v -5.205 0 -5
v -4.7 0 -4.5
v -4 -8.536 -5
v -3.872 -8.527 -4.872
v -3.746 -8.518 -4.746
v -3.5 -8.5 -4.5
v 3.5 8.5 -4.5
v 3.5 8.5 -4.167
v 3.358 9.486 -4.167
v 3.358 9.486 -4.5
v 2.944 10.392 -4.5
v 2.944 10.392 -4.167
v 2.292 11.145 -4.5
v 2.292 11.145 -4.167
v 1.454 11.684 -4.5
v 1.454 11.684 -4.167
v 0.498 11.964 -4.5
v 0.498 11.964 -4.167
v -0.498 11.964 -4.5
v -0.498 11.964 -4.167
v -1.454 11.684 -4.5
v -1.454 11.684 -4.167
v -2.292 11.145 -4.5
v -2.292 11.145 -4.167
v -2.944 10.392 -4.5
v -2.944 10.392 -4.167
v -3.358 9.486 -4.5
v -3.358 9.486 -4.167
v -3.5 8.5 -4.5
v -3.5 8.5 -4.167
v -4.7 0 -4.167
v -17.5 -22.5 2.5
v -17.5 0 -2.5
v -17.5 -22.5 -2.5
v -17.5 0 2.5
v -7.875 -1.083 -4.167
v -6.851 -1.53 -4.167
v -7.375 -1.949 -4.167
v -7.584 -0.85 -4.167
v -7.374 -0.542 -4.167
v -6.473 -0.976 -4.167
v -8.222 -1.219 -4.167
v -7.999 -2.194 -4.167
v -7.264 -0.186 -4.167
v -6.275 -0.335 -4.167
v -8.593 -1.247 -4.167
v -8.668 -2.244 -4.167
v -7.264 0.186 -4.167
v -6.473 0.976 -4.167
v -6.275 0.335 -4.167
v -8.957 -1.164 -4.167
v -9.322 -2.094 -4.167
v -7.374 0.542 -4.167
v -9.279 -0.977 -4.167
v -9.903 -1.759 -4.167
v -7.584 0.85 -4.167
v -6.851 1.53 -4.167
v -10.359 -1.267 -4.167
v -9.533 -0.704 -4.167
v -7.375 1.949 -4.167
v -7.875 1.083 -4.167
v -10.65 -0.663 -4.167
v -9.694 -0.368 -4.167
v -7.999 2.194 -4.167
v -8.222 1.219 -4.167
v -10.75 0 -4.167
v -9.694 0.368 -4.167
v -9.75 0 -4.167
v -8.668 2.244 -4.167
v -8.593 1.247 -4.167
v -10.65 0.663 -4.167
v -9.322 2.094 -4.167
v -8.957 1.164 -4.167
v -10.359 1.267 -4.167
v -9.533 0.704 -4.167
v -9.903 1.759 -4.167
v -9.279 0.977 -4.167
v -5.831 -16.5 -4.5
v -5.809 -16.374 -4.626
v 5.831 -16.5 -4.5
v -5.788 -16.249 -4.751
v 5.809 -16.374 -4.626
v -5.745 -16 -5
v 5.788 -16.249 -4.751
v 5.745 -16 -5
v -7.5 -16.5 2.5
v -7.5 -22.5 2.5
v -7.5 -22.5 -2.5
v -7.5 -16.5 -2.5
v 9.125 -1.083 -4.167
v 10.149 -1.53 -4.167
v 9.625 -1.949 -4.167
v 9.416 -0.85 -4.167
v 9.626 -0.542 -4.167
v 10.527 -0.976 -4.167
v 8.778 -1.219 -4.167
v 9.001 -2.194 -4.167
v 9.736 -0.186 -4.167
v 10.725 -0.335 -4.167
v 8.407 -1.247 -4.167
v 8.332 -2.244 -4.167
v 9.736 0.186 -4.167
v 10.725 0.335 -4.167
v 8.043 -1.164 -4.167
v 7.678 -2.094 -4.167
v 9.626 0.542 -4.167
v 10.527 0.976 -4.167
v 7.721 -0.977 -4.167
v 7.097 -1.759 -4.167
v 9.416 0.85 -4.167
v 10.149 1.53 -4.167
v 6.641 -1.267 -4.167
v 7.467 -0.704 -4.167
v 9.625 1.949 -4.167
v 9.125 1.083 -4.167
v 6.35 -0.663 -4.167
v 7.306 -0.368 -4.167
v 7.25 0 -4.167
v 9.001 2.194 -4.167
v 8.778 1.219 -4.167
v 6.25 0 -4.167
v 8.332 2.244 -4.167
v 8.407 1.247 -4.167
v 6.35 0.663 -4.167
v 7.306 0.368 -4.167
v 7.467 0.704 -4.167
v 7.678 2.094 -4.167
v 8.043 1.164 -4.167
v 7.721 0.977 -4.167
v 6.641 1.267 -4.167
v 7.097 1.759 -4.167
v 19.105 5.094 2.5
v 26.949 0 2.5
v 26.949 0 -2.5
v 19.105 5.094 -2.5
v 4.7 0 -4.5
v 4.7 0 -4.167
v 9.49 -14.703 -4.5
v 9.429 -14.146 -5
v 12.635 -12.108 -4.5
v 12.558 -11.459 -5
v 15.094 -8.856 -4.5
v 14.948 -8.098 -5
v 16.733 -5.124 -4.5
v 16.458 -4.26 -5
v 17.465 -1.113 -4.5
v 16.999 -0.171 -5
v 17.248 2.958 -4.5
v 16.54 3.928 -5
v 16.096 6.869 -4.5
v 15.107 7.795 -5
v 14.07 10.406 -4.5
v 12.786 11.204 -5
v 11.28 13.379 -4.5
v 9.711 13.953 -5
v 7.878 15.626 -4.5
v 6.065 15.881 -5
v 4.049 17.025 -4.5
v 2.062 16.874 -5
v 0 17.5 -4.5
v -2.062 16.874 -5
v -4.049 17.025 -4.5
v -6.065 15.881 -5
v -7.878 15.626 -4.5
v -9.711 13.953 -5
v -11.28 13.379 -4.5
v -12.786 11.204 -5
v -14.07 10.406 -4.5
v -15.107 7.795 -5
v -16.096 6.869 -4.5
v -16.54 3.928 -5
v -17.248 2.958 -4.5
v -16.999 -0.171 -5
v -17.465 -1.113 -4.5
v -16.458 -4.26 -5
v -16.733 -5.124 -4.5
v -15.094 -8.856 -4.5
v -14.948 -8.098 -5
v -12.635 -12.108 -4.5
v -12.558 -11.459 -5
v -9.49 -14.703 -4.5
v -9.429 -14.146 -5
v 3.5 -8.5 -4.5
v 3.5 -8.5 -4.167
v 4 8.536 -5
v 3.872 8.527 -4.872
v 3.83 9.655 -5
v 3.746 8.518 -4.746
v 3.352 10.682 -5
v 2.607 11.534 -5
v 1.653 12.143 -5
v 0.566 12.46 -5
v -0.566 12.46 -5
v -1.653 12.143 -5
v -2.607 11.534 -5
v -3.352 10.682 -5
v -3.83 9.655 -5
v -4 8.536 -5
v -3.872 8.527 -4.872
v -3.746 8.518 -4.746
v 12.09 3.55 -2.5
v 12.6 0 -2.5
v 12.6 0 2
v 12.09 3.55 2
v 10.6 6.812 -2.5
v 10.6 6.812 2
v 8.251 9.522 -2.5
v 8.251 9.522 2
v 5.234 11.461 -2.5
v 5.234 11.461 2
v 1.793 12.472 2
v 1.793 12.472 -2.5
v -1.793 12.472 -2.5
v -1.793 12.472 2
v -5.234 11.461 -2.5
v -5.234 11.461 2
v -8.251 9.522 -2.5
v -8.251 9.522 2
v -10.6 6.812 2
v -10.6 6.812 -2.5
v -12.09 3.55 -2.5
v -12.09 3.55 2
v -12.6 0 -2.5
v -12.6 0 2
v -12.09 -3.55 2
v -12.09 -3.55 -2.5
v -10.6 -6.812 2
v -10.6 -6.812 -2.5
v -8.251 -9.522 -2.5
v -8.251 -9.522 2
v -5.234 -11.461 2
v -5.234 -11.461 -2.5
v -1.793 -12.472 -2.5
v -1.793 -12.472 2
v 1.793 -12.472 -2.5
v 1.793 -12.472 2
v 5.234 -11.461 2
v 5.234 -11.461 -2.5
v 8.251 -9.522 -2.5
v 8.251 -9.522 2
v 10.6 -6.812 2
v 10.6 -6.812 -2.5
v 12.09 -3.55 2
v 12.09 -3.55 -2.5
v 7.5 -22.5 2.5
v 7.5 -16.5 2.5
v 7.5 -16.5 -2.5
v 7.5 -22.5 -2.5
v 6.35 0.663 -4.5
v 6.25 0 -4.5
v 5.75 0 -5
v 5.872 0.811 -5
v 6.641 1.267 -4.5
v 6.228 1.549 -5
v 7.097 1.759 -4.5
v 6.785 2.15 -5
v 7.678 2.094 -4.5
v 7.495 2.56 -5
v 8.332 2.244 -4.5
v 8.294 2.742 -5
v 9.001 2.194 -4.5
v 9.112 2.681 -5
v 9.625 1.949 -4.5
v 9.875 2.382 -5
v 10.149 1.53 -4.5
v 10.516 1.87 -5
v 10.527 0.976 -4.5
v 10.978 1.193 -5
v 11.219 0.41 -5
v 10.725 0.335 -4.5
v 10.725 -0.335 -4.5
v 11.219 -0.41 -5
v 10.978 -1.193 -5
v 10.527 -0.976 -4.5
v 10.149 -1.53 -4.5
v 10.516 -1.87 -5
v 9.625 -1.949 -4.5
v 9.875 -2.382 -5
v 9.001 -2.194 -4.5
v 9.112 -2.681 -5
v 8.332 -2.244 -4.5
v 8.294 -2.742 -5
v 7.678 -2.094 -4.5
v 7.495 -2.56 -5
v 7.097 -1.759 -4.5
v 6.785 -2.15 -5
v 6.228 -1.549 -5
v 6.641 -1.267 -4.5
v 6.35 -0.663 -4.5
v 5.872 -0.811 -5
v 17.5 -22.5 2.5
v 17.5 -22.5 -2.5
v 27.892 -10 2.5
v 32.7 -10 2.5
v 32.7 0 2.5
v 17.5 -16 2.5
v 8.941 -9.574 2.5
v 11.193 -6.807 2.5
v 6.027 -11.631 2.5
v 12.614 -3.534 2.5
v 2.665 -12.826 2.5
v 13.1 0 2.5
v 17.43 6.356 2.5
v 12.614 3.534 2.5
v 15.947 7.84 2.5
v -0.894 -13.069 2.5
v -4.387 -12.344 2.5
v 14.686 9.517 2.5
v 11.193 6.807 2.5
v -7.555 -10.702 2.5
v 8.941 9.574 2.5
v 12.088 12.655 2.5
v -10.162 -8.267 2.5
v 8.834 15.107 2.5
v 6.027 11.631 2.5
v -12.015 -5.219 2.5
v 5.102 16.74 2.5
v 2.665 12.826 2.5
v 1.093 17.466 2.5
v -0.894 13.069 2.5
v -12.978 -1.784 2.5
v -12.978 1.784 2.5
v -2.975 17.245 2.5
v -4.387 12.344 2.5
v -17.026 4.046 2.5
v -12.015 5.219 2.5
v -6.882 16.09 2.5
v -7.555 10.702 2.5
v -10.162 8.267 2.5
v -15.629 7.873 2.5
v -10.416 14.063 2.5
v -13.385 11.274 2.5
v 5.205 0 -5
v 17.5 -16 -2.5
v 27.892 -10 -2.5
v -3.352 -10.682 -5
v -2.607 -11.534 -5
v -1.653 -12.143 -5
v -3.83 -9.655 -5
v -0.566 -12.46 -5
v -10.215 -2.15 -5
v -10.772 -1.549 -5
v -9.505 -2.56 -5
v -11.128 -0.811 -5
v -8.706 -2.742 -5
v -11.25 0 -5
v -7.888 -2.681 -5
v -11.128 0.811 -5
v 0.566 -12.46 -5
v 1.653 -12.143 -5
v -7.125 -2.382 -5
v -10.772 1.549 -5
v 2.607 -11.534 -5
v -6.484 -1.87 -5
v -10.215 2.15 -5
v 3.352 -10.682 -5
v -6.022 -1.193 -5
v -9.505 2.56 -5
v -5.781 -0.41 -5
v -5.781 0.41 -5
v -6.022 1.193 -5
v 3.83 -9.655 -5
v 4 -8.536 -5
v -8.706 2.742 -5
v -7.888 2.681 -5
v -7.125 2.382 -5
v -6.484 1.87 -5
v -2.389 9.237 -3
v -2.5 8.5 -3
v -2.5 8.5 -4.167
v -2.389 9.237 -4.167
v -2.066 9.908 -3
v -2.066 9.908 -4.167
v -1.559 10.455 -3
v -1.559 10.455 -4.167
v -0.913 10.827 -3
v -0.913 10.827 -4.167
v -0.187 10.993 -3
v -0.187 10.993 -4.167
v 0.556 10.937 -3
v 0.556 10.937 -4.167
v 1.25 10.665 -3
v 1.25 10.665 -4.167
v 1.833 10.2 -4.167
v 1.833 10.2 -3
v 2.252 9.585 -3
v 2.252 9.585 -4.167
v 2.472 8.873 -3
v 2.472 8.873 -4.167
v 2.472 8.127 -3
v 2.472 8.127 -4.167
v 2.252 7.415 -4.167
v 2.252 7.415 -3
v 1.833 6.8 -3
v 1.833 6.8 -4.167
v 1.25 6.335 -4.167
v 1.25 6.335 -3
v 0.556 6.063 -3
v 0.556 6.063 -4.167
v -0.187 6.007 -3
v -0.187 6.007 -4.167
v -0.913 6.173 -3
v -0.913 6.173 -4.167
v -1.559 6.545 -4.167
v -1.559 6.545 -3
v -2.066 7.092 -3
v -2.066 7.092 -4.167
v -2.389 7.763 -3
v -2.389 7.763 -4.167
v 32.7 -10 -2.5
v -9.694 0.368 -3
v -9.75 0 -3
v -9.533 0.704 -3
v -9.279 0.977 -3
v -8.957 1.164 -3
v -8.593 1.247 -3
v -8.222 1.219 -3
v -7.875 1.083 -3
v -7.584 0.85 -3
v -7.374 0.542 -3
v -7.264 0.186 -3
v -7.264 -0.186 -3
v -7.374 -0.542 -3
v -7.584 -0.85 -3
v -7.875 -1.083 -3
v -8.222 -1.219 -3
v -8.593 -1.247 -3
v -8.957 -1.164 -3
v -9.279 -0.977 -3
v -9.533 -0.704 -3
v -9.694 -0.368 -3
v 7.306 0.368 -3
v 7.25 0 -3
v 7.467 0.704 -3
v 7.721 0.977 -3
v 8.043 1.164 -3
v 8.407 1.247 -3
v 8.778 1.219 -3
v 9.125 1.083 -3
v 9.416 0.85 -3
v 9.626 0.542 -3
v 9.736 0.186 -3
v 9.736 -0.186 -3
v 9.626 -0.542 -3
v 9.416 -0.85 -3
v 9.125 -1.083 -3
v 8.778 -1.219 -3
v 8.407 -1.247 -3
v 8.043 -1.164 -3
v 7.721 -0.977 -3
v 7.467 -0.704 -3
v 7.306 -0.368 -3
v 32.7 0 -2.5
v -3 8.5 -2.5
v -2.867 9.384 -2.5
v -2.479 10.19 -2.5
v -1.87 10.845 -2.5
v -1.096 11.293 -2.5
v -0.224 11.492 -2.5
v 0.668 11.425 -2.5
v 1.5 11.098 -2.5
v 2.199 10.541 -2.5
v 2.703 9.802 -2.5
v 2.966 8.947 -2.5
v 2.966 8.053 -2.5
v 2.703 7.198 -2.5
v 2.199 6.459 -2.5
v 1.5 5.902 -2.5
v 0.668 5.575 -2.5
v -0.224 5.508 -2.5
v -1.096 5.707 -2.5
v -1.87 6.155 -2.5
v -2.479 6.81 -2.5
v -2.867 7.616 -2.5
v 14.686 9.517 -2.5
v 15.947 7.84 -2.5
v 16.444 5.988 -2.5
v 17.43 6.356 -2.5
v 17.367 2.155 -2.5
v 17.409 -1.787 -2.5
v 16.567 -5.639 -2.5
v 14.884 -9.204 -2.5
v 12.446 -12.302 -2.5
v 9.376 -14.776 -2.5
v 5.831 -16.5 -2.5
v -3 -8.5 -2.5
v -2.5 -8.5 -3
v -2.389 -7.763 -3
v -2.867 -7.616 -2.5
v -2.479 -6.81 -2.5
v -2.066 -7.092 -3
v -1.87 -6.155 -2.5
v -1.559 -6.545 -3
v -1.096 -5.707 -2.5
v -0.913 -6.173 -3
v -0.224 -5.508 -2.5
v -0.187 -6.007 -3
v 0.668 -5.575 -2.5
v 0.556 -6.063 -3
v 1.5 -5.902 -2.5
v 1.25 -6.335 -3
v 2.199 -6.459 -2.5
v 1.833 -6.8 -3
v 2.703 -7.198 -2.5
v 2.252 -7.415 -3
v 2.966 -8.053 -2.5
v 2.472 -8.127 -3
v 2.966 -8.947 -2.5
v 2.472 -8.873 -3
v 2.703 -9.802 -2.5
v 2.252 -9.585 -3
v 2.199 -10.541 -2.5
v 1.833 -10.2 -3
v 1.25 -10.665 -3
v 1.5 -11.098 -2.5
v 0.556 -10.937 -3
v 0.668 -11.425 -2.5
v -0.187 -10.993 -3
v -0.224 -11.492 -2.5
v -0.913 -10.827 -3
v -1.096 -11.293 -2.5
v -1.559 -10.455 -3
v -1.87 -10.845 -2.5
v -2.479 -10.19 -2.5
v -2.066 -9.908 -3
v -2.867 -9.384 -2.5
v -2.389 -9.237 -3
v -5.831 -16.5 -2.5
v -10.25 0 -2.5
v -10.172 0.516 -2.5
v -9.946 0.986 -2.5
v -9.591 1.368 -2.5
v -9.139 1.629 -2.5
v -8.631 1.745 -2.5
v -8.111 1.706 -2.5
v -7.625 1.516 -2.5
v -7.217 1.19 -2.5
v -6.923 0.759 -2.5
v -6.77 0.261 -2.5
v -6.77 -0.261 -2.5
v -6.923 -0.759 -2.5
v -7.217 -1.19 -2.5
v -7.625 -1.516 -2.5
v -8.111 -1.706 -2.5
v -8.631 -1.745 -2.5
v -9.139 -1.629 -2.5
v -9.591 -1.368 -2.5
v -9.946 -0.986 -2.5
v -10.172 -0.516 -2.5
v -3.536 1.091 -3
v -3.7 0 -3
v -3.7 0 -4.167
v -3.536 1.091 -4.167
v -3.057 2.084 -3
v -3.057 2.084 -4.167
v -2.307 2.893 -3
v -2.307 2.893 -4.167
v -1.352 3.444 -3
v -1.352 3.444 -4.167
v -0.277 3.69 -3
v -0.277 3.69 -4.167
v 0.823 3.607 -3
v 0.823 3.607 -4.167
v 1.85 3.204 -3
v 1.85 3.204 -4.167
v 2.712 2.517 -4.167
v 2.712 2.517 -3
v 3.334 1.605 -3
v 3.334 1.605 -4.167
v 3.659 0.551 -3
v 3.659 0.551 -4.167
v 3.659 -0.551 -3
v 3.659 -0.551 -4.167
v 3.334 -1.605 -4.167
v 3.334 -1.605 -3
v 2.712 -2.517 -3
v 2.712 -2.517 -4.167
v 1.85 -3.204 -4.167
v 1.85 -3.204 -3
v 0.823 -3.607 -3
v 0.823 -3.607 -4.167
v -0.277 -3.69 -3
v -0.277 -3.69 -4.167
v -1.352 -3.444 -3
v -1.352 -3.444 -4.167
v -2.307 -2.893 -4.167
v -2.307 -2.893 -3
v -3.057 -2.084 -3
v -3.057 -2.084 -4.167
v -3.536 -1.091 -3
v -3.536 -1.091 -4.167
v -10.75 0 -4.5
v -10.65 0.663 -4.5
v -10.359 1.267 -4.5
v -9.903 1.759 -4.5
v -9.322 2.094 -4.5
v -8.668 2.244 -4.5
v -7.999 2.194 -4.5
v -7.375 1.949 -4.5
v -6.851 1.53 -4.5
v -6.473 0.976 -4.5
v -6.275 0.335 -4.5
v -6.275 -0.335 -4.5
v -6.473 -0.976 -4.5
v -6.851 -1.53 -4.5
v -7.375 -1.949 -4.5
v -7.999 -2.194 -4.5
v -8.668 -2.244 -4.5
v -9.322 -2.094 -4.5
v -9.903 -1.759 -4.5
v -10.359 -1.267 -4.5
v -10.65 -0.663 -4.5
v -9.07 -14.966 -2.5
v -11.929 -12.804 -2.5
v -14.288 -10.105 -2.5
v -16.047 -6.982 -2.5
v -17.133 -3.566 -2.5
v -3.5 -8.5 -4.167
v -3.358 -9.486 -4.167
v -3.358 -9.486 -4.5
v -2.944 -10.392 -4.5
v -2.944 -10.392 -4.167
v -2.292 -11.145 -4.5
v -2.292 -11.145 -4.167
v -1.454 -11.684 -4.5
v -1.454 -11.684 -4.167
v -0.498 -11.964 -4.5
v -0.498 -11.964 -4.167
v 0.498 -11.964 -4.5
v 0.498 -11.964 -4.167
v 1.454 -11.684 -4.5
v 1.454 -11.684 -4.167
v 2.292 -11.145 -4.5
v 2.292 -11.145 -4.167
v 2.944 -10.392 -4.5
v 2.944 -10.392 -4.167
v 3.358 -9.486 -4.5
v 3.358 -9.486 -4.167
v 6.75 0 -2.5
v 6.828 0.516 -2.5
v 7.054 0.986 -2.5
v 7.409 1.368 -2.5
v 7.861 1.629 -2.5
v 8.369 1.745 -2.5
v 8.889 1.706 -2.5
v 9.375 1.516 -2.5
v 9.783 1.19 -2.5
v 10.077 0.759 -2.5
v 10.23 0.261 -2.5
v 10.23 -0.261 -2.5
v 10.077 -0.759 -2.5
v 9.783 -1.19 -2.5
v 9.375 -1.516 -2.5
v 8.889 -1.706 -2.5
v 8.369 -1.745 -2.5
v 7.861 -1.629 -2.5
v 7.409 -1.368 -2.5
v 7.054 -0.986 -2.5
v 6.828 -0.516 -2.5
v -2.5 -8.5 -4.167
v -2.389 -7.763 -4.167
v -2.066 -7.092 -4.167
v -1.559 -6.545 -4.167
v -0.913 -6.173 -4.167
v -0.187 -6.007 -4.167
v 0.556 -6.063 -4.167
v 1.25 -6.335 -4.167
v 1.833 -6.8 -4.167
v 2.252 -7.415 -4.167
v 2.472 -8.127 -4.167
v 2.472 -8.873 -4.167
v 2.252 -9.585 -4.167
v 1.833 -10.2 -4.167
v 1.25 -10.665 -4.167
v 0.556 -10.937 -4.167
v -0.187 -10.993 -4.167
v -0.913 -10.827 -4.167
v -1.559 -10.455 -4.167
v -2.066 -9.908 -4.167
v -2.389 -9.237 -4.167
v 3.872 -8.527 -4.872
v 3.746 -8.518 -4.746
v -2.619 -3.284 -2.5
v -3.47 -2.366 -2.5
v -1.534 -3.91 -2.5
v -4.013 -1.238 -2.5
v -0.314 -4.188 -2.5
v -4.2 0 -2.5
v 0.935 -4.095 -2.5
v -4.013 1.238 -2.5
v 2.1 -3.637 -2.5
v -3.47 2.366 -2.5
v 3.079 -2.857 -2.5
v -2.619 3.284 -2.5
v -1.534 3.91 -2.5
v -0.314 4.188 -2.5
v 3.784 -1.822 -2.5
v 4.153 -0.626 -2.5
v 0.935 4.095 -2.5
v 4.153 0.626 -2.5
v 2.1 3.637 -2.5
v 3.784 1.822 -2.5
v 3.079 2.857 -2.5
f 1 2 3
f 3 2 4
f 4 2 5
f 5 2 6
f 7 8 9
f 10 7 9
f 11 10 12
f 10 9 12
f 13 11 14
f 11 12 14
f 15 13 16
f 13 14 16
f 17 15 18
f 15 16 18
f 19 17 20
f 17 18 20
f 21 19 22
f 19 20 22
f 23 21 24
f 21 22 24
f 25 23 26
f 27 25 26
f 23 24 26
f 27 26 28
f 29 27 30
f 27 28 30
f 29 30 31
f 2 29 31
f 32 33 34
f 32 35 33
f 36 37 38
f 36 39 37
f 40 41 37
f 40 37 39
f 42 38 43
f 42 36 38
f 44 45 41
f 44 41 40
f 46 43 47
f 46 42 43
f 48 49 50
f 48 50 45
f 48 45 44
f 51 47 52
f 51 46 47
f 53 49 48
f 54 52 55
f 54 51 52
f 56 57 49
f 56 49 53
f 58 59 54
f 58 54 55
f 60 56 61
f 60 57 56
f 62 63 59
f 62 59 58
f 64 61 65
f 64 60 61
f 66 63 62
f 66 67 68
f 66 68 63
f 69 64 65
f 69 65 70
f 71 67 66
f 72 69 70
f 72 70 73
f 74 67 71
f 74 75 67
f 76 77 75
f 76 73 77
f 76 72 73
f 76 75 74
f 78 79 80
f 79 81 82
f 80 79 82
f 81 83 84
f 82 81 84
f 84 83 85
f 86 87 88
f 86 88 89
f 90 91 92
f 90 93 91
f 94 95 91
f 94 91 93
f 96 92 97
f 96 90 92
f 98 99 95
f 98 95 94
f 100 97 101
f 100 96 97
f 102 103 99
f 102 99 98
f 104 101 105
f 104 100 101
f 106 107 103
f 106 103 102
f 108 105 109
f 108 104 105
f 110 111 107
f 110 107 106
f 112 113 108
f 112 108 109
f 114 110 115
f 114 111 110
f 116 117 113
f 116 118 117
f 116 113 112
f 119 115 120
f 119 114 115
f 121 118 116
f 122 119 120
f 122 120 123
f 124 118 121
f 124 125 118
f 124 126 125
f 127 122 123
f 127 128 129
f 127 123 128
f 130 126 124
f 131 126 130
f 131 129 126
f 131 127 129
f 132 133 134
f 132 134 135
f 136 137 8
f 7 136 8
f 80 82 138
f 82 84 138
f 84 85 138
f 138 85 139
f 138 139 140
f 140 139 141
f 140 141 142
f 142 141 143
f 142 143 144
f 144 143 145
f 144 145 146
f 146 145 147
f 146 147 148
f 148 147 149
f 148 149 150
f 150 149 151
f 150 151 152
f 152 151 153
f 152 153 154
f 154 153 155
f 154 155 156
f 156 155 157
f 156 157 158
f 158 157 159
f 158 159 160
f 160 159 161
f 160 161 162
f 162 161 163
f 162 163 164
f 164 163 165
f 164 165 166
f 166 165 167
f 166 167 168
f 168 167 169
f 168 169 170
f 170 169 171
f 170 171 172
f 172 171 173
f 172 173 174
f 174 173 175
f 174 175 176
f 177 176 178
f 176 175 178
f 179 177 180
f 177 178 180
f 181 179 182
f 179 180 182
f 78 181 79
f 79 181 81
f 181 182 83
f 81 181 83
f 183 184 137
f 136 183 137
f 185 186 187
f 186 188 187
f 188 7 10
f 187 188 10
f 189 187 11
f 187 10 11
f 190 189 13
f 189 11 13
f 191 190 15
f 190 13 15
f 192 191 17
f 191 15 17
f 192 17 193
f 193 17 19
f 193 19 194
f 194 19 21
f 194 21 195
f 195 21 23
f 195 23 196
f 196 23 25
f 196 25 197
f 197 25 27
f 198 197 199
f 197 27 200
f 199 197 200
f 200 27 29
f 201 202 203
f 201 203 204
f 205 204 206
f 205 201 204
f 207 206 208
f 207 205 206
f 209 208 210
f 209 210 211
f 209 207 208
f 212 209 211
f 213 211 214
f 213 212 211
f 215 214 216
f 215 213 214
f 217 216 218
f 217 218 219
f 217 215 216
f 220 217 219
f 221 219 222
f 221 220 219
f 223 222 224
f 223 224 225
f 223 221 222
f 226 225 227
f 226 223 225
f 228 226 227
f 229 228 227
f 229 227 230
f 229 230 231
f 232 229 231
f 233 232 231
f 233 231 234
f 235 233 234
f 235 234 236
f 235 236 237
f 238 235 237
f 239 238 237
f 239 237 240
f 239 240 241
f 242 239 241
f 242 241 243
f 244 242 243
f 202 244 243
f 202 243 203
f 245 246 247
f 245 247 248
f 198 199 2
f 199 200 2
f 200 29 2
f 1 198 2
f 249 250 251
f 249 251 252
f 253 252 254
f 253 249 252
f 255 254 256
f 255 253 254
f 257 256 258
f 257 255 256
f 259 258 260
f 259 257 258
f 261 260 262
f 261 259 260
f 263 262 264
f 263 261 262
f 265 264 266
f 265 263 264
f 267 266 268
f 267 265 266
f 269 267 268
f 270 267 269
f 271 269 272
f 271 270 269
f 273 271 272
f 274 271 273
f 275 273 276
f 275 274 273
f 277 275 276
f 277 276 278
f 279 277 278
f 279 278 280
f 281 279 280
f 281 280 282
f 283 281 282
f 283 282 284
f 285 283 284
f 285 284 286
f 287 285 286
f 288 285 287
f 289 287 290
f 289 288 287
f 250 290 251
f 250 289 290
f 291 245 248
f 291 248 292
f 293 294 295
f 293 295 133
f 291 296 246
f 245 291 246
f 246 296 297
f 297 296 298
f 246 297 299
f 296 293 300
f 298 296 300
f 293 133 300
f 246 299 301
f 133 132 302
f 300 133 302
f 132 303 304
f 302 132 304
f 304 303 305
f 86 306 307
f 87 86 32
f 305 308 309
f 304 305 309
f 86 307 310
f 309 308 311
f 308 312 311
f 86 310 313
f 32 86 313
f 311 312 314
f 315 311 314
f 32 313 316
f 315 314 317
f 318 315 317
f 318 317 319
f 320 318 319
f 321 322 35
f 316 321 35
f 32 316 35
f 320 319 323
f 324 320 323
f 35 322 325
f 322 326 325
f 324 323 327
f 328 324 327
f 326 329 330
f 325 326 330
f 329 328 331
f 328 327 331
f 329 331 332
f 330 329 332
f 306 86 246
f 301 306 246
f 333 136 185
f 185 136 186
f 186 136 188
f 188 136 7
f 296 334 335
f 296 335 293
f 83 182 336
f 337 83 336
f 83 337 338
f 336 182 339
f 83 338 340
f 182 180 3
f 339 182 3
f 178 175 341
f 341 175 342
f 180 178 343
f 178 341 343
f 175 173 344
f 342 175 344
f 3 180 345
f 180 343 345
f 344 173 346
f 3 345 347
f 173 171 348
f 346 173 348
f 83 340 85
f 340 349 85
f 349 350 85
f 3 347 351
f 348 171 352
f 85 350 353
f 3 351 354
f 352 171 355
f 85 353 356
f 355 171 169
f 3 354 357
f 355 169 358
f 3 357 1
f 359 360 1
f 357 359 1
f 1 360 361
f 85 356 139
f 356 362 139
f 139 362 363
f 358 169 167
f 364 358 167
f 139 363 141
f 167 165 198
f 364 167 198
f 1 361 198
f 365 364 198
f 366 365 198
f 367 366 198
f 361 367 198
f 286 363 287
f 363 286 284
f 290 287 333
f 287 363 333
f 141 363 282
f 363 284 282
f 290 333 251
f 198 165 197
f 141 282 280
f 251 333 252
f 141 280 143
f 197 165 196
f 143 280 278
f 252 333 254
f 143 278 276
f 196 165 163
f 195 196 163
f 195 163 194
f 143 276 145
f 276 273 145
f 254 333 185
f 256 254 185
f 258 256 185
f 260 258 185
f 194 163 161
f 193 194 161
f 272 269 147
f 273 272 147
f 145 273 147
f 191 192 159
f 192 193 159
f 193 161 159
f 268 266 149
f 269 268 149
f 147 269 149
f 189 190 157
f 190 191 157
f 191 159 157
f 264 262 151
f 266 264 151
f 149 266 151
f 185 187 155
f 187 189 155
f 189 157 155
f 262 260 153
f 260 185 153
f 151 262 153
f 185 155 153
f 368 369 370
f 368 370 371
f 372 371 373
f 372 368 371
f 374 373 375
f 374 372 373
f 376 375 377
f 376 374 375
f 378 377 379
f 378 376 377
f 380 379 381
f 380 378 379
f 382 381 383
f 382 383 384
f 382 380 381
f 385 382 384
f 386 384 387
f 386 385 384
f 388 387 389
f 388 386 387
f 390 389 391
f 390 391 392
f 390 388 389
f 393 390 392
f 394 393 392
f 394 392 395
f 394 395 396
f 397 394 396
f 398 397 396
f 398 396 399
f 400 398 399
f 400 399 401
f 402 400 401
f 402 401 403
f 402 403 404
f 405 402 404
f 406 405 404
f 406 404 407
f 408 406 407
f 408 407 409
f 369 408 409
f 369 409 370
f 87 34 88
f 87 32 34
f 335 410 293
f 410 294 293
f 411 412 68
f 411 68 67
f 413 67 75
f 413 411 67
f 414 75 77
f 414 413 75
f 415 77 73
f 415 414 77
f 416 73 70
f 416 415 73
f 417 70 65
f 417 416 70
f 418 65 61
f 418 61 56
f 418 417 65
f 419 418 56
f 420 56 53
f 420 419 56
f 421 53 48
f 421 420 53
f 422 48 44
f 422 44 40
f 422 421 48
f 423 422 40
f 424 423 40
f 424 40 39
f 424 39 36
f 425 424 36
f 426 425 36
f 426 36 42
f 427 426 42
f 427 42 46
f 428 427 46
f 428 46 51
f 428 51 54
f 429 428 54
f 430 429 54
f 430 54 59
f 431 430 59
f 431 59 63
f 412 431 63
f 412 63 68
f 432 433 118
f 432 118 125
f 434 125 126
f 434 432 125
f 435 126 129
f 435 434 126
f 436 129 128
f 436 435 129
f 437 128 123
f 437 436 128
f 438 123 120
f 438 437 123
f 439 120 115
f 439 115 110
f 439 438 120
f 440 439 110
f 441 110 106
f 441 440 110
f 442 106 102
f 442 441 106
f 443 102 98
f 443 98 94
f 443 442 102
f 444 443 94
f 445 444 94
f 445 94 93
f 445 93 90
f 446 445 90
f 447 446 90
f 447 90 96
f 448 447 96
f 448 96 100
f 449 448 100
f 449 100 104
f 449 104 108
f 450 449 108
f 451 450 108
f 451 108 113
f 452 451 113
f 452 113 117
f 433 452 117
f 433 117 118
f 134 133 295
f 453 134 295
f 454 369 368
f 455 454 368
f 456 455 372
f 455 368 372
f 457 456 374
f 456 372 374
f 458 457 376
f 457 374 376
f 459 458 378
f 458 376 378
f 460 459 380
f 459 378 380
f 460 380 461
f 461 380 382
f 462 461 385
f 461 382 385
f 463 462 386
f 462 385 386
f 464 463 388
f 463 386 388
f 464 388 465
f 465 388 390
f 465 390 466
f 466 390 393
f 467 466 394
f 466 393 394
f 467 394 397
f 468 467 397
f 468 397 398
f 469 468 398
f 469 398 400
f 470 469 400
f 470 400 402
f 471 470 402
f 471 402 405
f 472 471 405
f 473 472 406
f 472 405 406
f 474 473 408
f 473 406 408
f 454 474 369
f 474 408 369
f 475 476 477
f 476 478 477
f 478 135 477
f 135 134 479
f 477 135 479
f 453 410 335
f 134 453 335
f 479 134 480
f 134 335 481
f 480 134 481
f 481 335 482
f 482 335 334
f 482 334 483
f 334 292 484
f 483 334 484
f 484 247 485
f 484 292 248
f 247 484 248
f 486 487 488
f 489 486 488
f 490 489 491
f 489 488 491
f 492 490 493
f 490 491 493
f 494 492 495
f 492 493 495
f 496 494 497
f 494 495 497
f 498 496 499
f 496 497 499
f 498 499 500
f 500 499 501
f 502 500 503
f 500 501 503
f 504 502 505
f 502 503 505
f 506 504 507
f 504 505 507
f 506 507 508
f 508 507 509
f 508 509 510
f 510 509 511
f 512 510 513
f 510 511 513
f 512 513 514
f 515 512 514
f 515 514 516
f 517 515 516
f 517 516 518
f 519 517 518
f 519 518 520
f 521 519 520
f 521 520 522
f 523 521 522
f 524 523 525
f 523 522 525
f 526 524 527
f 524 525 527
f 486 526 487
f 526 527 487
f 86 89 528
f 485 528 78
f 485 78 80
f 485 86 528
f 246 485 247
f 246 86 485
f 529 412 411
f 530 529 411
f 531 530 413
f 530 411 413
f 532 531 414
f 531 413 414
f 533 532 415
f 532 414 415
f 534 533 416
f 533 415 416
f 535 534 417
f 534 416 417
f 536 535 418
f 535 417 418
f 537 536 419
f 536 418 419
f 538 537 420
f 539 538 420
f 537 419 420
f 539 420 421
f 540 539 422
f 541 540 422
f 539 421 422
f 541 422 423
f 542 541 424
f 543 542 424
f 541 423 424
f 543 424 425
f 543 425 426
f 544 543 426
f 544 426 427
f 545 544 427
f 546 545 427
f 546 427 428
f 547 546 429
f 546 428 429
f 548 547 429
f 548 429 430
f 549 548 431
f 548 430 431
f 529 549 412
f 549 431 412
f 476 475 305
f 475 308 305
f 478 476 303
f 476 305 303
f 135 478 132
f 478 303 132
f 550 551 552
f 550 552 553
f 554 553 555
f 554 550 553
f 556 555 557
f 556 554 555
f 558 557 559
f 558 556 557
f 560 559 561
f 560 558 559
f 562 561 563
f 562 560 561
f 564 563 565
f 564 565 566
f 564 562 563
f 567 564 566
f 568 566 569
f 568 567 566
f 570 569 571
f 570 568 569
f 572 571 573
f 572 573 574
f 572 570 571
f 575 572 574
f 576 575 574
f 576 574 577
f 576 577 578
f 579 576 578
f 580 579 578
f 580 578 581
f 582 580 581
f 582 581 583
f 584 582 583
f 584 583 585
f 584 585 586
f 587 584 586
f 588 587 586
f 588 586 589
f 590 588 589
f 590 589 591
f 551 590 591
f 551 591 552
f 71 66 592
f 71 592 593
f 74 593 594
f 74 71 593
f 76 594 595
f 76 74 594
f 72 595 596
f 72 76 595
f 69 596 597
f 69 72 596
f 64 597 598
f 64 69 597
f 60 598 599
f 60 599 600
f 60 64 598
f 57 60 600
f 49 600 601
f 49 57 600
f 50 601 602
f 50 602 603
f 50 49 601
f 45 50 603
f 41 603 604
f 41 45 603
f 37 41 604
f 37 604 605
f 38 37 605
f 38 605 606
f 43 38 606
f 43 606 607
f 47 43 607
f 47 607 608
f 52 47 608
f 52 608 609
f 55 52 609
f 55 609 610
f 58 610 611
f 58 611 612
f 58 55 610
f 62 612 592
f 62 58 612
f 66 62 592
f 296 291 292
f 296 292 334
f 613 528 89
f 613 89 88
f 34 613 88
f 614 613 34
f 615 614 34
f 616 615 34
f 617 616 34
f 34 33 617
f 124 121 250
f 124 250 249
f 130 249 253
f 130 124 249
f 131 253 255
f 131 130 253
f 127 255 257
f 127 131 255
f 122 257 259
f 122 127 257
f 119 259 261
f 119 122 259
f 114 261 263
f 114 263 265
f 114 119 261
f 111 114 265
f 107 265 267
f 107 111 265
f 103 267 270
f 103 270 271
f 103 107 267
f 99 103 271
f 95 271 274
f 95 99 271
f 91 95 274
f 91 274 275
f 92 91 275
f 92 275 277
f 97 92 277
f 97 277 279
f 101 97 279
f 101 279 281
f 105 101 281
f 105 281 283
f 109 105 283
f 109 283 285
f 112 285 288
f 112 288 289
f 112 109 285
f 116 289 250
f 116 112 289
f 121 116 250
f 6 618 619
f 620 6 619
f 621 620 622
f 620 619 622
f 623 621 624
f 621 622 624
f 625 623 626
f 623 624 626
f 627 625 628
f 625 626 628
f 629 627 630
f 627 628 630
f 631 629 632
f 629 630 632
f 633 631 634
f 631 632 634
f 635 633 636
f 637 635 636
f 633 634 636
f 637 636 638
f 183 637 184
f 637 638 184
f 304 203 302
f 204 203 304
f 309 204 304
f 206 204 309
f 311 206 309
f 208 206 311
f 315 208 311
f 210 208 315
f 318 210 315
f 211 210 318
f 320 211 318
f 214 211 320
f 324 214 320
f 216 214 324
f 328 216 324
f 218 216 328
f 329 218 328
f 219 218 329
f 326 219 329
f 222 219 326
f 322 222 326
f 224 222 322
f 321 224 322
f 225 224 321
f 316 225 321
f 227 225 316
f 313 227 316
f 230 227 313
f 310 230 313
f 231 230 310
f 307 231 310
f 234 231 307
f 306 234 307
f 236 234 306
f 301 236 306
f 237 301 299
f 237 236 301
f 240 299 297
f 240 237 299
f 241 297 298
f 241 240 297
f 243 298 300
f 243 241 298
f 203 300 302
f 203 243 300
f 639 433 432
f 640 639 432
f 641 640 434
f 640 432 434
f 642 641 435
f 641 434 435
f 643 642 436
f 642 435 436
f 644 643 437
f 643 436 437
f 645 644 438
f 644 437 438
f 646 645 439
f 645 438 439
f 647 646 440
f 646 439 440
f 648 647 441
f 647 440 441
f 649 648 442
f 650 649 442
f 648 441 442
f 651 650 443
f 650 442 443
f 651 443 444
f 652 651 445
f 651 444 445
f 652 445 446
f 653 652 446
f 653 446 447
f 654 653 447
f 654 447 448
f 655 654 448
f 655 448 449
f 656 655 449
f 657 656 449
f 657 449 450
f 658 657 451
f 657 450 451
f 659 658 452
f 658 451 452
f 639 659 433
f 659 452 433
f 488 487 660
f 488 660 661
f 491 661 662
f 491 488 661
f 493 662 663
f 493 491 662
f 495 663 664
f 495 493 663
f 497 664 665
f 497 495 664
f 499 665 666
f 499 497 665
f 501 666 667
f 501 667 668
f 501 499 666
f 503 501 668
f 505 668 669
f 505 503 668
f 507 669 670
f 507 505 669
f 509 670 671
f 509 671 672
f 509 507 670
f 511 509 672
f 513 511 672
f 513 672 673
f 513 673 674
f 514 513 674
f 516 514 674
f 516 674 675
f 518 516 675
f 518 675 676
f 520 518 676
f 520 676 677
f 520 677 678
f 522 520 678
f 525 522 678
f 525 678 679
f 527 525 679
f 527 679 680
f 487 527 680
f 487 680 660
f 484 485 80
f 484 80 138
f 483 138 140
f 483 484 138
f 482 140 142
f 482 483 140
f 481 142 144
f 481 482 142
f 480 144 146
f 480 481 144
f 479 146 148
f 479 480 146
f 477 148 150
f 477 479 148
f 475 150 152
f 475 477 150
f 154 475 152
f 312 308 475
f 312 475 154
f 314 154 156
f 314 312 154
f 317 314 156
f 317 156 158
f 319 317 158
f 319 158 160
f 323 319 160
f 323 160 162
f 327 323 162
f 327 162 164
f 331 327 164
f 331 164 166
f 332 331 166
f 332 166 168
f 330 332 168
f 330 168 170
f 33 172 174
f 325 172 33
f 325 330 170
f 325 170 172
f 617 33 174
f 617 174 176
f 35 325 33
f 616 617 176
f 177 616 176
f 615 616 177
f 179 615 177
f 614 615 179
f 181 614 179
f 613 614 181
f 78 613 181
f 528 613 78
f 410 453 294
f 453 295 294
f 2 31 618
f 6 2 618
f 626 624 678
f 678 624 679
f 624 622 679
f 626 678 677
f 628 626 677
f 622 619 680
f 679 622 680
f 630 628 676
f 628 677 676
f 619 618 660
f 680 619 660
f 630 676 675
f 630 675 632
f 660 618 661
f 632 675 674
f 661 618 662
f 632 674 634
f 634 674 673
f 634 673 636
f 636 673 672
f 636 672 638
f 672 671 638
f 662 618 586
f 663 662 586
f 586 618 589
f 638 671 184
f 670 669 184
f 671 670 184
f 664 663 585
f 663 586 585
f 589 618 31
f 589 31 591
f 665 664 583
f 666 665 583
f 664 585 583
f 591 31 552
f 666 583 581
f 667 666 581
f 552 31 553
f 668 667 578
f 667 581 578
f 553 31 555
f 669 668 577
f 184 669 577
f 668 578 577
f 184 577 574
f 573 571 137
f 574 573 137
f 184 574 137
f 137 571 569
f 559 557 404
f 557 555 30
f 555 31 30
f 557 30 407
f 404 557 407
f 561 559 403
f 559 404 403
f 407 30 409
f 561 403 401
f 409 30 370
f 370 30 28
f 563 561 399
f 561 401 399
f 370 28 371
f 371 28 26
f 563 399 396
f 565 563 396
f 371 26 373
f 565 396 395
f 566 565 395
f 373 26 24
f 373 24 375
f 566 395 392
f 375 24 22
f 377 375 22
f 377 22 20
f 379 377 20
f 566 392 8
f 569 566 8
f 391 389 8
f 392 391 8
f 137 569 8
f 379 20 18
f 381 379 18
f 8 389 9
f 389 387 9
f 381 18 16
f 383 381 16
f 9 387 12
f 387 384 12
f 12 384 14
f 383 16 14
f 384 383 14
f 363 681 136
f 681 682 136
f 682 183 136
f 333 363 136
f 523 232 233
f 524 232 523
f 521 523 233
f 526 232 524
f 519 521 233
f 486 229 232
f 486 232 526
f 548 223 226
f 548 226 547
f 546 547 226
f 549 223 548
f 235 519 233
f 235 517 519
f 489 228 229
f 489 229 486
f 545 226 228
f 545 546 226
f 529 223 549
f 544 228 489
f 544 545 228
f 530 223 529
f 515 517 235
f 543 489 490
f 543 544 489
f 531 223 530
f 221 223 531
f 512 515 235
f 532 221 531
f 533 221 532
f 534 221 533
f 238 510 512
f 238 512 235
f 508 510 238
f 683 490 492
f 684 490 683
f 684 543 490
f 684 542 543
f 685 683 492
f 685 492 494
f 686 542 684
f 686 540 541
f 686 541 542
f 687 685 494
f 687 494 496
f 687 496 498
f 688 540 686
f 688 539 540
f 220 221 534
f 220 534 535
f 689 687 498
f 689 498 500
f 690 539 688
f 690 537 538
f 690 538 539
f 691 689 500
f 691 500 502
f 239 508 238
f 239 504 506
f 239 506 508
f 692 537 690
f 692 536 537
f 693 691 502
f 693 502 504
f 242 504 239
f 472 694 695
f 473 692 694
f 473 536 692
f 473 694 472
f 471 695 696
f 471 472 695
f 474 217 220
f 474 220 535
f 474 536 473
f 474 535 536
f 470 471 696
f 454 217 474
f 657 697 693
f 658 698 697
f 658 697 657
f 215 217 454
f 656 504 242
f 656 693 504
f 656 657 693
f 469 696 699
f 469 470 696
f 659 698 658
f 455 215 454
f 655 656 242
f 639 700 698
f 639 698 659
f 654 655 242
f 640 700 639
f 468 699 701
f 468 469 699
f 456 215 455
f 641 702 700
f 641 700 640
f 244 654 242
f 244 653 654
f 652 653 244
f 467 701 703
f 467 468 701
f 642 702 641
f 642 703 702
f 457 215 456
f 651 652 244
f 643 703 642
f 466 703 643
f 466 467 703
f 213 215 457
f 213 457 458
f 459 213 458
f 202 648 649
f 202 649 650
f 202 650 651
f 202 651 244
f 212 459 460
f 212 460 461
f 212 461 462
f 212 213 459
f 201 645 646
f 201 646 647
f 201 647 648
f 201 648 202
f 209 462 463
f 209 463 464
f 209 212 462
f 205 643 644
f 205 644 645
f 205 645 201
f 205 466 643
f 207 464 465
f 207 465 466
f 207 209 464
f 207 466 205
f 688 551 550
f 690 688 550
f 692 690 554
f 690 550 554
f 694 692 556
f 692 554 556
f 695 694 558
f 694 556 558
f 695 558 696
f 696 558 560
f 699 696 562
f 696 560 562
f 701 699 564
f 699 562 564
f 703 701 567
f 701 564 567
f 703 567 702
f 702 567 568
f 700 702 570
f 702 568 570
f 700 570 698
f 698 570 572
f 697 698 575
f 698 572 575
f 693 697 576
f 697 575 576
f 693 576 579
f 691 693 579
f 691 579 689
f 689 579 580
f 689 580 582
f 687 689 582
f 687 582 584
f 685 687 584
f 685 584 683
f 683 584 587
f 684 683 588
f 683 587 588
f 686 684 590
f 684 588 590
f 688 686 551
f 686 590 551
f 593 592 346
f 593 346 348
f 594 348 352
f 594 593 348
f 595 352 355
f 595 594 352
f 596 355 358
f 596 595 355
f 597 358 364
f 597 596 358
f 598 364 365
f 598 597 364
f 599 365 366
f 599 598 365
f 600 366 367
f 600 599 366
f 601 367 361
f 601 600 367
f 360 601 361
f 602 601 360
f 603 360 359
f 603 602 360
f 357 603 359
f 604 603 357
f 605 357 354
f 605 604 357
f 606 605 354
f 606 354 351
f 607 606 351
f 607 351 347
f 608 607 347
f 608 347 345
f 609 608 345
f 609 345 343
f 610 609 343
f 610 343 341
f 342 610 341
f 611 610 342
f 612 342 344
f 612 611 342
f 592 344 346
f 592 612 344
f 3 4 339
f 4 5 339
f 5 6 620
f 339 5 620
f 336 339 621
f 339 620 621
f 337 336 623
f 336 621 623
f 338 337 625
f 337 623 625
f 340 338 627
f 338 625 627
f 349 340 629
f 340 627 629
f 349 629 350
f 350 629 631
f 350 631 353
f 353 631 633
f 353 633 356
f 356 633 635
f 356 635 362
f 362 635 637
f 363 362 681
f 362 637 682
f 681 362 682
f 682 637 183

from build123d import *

# Parameters (mm, degrees)
SKETCH1_R           = 12.600000000000001
BOSS_EXTRUDE1_DEPTH = 2.5
BOSS_EXTRUDE3_DEPTH = 2.5
SKETCH4_R           = 1.2499999999999973
SKETCH4_R_2         = 2.5000000000000018
SKETCH4_R_3         = 3.7
BOSS_EXTRUDE4_DEPTH = 2.5
CUT_EXTRUDE1_START  = -0.8333333333333334
SKETCH5_R           = 2.249999999999998
SKETCH5_R_2         = 1.2499999999999973
SKETCH5_R_3         = 2.500000000000002
SKETCH5_R_4         = 3.7
SKETCH5_R_5         = 2.2499999999999987
CUT_EXTRUDE1_DEPTH  = 0.8333333333333334
CHAMFER1_SIZE       = 0.5
CHAMFER2_SIZE       = 0.5
FILLET2_R           = 15
CHAMFER6_SIZE       = 6
CHAMFER6_SIZE2      = 10.392304845413321


with BuildPart() as part:
    # Sketch1 → Boss-Extrude1 (new, symmetric)
    with BuildSketch(Plane.XY):
        with BuildLine():
            Line((-17.5, -22.500000000000004), (-7.500000000000002, -22.500000000000004))
            Line((-7.500000000000002, -22.500000000000004), (-7.500000000000002, -16.5))
            Line((-7.500000000000002, -16.5), (7.500000000000005, -16.5))
            Line((7.500000000000005, -16.5), (7.500000000000007, -22.500000000000004))
            Line((7.500000000000007, -22.500000000000004), (17.500000000000007, -22.5))
            Line((17.500000000000007, -22.5), (17.500000000000004, 0))
            ThreePointArc((17.500000000000004, 0), (-2.81e-15, 17.500000000000004), (-17.500000000000004, -6.94e-15))
            Line((-17.500000000000004, -6.94e-15), (-17.5, -22.500000000000004))
        make_face()
        Circle(SKETCH1_R, mode=Mode.SUBTRACT)
    extrude(amount=BOSS_EXTRUDE1_DEPTH, both=True)

    # Sketch3 → Boss-Extrude3 (add, symmetric)
    with BuildSketch(Plane.XY):
        Polygon((17.500000000000007, -10.000000000000002), (17.500000000000004, 0), (32.70000000000001, 0), (32.70000000000001, -10), align=None)
    extrude(amount=BOSS_EXTRUDE3_DEPTH, both=True)

    # Sketch4 → Boss-Extrude4 (add)
    with BuildSketch(Plane(origin=(0, 0, -2.5), x_dir=(-1, 0, 0), z_dir=(0, 0, -1))):
        with BuildLine():
            Line((5.8309518948453105, -16.5), (-5.8309518948453105, -16.5))
            ThreePointArc((-5.8309518948453105, -16.5), (4.96e-15, 17.500000000000004), (5.8309518948453105, -16.5))
        make_face()
        with Locations((-8.5, 0)):
            Circle(SKETCH4_R, mode=Mode.SUBTRACT)
        with Locations((8.5, 0)):
            Circle(SKETCH4_R, mode=Mode.SUBTRACT)
        with Locations((0, -8.5)):
            Circle(SKETCH4_R_2, mode=Mode.SUBTRACT)
        with Locations((0, 8.5)):
            Circle(SKETCH4_R_2, mode=Mode.SUBTRACT)
        Circle(SKETCH4_R_3, mode=Mode.SUBTRACT)
    extrude(amount=BOSS_EXTRUDE4_DEPTH)

    # Sketch5 → Cut-Extrude1 (cut)
    # profile 1 of 3: a face of its own
    with BuildSketch(Plane(origin=(0, 0, -5), x_dir=(-1, 0, 0), z_dir=(0, 0, -1)).offset(CUT_EXTRUDE1_START)):
        with Locations((-8.5, 0)):
            Circle(SKETCH5_R)
        with Locations((-8.5, 0)):
            Circle(SKETCH5_R_2, mode=Mode.SUBTRACT)
    # profile 2 of 3: a face of its own
    with BuildSketch(Plane(origin=(0, 0, -5), x_dir=(-1, 0, 0), z_dir=(0, 0, -1)).offset(CUT_EXTRUDE1_START)):
        with BuildLine():
            Line((3.500000000000002, 8.5), (4.7, 0))
            Line((4.7, 0), (3.500000000000002, -8.5))
            ThreePointArc((3.500000000000002, -8.5), (-6.4e-16, -12.000000000000002), (-3.500000000000002, -8.5))
            Line((-3.500000000000002, -8.5), (-4.7, 0))
            Line((-4.7, 0), (-3.500000000000002, 8.5))
            ThreePointArc((-3.500000000000002, 8.5), (2.1e-16, 12.000000000000002), (3.500000000000002, 8.5))
        make_face()
        with Locations((0, 8.5)):
            Circle(SKETCH5_R_3, mode=Mode.SUBTRACT)
        with Locations((0, -8.5)):
            Circle(SKETCH5_R_3, mode=Mode.SUBTRACT)
        Circle(SKETCH5_R_4, mode=Mode.SUBTRACT)
    # profile 3 of 3: a face of its own
    with BuildSketch(Plane(origin=(0, 0, -5), x_dir=(-1, 0, 0), z_dir=(0, 0, -1)).offset(CUT_EXTRUDE1_START)):
        with Locations((8.5, 0)):
            Circle(SKETCH5_R_5)
        with Locations((8.5, 0)):
            Circle(SKETCH5_R_2, mode=Mode.SUBTRACT)
    extrude(amount=CUT_EXTRUDE1_DEPTH, mode=Mode.SUBTRACT)

    # Chamfer1
    chamfer1_edges = [part.edges().sort_by_distance(p)[0] for p in [
        (-2.66e-15, 17.500000000000004, -5),
        (0, -16.5, -5),
        (10.749999999999998, 2.8e-16, -5),
        (-4.100000000000001, 4.25, -5),
        (-4.100000000000001, -4.25, -5),
        (-1e-17, 12, -5),
        (4.100000000000001, 4.25, -5),
        (4.100000000000001, -4.25, -5),
        (2.3e-16, -12, -5),
        (-6.250000000000002, 2.8e-16, -5),
    ]]
    chamfer(chamfer1_edges, length=CHAMFER1_SIZE)

    # Chamfer2
    chamfer2_edges = [part.edges().sort_by_distance(p)[0] for p in [
        (-12.600000000000001, 1.54e-15, 2.5),
        (3.7, 4.5e-16, -2.5),
        (2.5000000000000018, 8.5, -2.5),
        (2.5000000000000018, -8.5, -2.5),
        (-7.250000000000003, 1.5e-16, -2.5),
        (9.749999999999996, 1.5e-16, -2.5),
    ]]
    chamfer(chamfer2_edges, length=CHAMFER2_SIZE)

    # Chamfer4
    # the kernel refuses this chamfer: 12 mm, written as the material it adds along each edge
    with BuildSketch(Plane(origin=(17.500000000000004, 0, 2.5), x_dir=(0.999648118666469, -0.026526191709121207, 0), z_dir=(0, 0, -1))) as chamfer4_piece_1:
        with BuildLine():
            Line((9.855061796439113, 1e-17), (-2.110948481595115, -7.326644011468382))
            Line((-2.110948481595115, -7.326644011468382), (-2.3275279701108307, -7.223235476258414))
            ThreePointArc((-2.3275279701108307, -7.223235476258414), (-0.7534896907076923, -3.7391476844990703), (-0.239915548479951, 0.00636628601018905))
            Line((-0.239915548479951, 0.00636628601018905), (0.00636628601018909, 0.23991554847995256))
            ThreePointArc((0.00636628601018909, 0.23991554847995256), (4.93042998207199, 0.10925291314792994), (9.861428082449303, 0.2399155484799526))
            Line((9.861428082449303, 0.2399155484799526), (9.855061796439113, 1e-17))
        make_face()
    extrude(amount=5)

    # Fillet2
    fillet2_edges = [part.edges().sort_by_distance(p)[0] for p in [
        (15.986710313133337, 7.118644067795235, 0),
    ]]
    fillet(fillet2_edges, radius=FILLET2_R)

    # Chamfer6
    chamfer6_edges = [part.edges().sort_by_distance(p)[0] for p in [
        (17.500000000000007, -10.000000000000002, 0),
    ]]
    chamfer6_side = [part.faces().sort_by_distance(p)[0] for p in [
        (17.500000000000007, -16.25, 4e-17),
    ]]
    chamfer(chamfer6_edges, length=CHAMFER6_SIZE, length2=CHAMFER6_SIZE2, reference=chamfer6_side[0])


solid = part.part
